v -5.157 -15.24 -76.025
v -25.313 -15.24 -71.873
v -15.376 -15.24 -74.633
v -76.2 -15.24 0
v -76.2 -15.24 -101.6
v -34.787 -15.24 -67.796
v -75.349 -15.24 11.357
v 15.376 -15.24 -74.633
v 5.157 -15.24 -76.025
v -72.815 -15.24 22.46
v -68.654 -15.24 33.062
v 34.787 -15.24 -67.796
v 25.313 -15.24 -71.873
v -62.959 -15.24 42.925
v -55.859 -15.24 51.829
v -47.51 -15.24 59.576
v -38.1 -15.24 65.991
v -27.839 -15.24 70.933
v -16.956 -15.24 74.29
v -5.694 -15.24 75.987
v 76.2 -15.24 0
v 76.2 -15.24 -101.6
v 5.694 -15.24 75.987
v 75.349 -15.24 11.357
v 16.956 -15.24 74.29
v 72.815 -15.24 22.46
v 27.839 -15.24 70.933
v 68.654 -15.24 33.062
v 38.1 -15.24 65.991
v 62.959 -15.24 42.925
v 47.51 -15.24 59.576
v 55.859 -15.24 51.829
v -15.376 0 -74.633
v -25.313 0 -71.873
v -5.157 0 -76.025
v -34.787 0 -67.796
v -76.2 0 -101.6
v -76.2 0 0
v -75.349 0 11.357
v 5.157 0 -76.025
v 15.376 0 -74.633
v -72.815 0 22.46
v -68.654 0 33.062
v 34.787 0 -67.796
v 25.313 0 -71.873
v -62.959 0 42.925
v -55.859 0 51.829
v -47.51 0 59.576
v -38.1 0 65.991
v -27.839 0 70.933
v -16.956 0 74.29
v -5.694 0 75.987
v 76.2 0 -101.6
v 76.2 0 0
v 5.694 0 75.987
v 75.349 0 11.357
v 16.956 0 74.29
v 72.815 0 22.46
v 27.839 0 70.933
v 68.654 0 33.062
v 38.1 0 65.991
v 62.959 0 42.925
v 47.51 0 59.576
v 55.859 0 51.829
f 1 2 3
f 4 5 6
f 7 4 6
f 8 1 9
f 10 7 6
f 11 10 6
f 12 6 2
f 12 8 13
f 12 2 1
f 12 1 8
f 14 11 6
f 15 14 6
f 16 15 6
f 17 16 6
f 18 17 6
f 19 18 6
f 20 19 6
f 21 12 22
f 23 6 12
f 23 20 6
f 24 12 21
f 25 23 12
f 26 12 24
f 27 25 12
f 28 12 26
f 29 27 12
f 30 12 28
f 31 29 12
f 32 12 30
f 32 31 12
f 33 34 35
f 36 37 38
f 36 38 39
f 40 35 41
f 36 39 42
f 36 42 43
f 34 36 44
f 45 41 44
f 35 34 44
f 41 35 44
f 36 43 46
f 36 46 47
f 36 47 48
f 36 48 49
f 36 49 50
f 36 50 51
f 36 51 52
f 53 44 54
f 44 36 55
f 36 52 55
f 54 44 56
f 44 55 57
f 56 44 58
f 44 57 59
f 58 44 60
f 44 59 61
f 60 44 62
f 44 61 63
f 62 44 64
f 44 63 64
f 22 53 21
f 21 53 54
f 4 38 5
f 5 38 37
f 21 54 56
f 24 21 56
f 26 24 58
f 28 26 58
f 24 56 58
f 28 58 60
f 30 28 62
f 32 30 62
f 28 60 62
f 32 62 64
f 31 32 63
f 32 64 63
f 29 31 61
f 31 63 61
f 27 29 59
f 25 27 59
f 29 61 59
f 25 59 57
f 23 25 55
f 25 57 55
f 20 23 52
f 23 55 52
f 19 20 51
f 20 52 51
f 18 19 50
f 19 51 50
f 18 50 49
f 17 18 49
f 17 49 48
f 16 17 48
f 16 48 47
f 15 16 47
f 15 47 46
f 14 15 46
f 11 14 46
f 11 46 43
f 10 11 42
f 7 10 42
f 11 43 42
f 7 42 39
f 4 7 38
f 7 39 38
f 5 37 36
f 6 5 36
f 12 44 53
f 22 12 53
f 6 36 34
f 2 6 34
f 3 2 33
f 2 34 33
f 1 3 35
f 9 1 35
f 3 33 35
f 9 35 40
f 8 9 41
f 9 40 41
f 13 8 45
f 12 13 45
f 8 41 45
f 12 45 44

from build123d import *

# Parameters (mm, degrees)
F1_DEPTH = 15.24


# Not quite as in the source:
# - a feature names something its author has since deleted; it is built from what else it names


with BuildPart() as f1:
    # F0 (on Front) → F1 (new body)
    with BuildSketch(Plane.XZ):
        with BuildLine():
            ThreePointArc((34.7869106265, -67.7960975946), (65.0276963676, -39.7220178884), (76.2, 0))
            ThreePointArc((76.2, 0), (0, 76.2), (-76.2, 0))
            ThreePointArc((-76.2, 0), (-65.0276963676, -39.7220178884), (-34.7869106265, -67.7960975946))
            ThreePointArc((-34.7869106265, -67.7960975946), (0, -76.2), (34.7869106265, -67.7960975946))
        make_face()
        with BuildLine():
            Line((76.2, -101.6), (76.2, 0))
            ThreePointArc((76.2, 0), (65.0276963676, -39.7220178884), (34.7869106265, -67.7960975946))
            Line((34.7869106265, -67.7960975946), (76.2, -101.6))
        make_face()
        with BuildLine():
            ThreePointArc((-34.7869106265, -67.7960975946), (-65.0276963676, -39.7220178884), (-76.2, 0))
            Line((-76.2, 0), (-76.2, -101.6))
            Line((-76.2, -101.6), (-34.7869106265, -67.7960975946))
        make_face()
    extrude(amount=F1_DEPTH)


solid = f1.part
